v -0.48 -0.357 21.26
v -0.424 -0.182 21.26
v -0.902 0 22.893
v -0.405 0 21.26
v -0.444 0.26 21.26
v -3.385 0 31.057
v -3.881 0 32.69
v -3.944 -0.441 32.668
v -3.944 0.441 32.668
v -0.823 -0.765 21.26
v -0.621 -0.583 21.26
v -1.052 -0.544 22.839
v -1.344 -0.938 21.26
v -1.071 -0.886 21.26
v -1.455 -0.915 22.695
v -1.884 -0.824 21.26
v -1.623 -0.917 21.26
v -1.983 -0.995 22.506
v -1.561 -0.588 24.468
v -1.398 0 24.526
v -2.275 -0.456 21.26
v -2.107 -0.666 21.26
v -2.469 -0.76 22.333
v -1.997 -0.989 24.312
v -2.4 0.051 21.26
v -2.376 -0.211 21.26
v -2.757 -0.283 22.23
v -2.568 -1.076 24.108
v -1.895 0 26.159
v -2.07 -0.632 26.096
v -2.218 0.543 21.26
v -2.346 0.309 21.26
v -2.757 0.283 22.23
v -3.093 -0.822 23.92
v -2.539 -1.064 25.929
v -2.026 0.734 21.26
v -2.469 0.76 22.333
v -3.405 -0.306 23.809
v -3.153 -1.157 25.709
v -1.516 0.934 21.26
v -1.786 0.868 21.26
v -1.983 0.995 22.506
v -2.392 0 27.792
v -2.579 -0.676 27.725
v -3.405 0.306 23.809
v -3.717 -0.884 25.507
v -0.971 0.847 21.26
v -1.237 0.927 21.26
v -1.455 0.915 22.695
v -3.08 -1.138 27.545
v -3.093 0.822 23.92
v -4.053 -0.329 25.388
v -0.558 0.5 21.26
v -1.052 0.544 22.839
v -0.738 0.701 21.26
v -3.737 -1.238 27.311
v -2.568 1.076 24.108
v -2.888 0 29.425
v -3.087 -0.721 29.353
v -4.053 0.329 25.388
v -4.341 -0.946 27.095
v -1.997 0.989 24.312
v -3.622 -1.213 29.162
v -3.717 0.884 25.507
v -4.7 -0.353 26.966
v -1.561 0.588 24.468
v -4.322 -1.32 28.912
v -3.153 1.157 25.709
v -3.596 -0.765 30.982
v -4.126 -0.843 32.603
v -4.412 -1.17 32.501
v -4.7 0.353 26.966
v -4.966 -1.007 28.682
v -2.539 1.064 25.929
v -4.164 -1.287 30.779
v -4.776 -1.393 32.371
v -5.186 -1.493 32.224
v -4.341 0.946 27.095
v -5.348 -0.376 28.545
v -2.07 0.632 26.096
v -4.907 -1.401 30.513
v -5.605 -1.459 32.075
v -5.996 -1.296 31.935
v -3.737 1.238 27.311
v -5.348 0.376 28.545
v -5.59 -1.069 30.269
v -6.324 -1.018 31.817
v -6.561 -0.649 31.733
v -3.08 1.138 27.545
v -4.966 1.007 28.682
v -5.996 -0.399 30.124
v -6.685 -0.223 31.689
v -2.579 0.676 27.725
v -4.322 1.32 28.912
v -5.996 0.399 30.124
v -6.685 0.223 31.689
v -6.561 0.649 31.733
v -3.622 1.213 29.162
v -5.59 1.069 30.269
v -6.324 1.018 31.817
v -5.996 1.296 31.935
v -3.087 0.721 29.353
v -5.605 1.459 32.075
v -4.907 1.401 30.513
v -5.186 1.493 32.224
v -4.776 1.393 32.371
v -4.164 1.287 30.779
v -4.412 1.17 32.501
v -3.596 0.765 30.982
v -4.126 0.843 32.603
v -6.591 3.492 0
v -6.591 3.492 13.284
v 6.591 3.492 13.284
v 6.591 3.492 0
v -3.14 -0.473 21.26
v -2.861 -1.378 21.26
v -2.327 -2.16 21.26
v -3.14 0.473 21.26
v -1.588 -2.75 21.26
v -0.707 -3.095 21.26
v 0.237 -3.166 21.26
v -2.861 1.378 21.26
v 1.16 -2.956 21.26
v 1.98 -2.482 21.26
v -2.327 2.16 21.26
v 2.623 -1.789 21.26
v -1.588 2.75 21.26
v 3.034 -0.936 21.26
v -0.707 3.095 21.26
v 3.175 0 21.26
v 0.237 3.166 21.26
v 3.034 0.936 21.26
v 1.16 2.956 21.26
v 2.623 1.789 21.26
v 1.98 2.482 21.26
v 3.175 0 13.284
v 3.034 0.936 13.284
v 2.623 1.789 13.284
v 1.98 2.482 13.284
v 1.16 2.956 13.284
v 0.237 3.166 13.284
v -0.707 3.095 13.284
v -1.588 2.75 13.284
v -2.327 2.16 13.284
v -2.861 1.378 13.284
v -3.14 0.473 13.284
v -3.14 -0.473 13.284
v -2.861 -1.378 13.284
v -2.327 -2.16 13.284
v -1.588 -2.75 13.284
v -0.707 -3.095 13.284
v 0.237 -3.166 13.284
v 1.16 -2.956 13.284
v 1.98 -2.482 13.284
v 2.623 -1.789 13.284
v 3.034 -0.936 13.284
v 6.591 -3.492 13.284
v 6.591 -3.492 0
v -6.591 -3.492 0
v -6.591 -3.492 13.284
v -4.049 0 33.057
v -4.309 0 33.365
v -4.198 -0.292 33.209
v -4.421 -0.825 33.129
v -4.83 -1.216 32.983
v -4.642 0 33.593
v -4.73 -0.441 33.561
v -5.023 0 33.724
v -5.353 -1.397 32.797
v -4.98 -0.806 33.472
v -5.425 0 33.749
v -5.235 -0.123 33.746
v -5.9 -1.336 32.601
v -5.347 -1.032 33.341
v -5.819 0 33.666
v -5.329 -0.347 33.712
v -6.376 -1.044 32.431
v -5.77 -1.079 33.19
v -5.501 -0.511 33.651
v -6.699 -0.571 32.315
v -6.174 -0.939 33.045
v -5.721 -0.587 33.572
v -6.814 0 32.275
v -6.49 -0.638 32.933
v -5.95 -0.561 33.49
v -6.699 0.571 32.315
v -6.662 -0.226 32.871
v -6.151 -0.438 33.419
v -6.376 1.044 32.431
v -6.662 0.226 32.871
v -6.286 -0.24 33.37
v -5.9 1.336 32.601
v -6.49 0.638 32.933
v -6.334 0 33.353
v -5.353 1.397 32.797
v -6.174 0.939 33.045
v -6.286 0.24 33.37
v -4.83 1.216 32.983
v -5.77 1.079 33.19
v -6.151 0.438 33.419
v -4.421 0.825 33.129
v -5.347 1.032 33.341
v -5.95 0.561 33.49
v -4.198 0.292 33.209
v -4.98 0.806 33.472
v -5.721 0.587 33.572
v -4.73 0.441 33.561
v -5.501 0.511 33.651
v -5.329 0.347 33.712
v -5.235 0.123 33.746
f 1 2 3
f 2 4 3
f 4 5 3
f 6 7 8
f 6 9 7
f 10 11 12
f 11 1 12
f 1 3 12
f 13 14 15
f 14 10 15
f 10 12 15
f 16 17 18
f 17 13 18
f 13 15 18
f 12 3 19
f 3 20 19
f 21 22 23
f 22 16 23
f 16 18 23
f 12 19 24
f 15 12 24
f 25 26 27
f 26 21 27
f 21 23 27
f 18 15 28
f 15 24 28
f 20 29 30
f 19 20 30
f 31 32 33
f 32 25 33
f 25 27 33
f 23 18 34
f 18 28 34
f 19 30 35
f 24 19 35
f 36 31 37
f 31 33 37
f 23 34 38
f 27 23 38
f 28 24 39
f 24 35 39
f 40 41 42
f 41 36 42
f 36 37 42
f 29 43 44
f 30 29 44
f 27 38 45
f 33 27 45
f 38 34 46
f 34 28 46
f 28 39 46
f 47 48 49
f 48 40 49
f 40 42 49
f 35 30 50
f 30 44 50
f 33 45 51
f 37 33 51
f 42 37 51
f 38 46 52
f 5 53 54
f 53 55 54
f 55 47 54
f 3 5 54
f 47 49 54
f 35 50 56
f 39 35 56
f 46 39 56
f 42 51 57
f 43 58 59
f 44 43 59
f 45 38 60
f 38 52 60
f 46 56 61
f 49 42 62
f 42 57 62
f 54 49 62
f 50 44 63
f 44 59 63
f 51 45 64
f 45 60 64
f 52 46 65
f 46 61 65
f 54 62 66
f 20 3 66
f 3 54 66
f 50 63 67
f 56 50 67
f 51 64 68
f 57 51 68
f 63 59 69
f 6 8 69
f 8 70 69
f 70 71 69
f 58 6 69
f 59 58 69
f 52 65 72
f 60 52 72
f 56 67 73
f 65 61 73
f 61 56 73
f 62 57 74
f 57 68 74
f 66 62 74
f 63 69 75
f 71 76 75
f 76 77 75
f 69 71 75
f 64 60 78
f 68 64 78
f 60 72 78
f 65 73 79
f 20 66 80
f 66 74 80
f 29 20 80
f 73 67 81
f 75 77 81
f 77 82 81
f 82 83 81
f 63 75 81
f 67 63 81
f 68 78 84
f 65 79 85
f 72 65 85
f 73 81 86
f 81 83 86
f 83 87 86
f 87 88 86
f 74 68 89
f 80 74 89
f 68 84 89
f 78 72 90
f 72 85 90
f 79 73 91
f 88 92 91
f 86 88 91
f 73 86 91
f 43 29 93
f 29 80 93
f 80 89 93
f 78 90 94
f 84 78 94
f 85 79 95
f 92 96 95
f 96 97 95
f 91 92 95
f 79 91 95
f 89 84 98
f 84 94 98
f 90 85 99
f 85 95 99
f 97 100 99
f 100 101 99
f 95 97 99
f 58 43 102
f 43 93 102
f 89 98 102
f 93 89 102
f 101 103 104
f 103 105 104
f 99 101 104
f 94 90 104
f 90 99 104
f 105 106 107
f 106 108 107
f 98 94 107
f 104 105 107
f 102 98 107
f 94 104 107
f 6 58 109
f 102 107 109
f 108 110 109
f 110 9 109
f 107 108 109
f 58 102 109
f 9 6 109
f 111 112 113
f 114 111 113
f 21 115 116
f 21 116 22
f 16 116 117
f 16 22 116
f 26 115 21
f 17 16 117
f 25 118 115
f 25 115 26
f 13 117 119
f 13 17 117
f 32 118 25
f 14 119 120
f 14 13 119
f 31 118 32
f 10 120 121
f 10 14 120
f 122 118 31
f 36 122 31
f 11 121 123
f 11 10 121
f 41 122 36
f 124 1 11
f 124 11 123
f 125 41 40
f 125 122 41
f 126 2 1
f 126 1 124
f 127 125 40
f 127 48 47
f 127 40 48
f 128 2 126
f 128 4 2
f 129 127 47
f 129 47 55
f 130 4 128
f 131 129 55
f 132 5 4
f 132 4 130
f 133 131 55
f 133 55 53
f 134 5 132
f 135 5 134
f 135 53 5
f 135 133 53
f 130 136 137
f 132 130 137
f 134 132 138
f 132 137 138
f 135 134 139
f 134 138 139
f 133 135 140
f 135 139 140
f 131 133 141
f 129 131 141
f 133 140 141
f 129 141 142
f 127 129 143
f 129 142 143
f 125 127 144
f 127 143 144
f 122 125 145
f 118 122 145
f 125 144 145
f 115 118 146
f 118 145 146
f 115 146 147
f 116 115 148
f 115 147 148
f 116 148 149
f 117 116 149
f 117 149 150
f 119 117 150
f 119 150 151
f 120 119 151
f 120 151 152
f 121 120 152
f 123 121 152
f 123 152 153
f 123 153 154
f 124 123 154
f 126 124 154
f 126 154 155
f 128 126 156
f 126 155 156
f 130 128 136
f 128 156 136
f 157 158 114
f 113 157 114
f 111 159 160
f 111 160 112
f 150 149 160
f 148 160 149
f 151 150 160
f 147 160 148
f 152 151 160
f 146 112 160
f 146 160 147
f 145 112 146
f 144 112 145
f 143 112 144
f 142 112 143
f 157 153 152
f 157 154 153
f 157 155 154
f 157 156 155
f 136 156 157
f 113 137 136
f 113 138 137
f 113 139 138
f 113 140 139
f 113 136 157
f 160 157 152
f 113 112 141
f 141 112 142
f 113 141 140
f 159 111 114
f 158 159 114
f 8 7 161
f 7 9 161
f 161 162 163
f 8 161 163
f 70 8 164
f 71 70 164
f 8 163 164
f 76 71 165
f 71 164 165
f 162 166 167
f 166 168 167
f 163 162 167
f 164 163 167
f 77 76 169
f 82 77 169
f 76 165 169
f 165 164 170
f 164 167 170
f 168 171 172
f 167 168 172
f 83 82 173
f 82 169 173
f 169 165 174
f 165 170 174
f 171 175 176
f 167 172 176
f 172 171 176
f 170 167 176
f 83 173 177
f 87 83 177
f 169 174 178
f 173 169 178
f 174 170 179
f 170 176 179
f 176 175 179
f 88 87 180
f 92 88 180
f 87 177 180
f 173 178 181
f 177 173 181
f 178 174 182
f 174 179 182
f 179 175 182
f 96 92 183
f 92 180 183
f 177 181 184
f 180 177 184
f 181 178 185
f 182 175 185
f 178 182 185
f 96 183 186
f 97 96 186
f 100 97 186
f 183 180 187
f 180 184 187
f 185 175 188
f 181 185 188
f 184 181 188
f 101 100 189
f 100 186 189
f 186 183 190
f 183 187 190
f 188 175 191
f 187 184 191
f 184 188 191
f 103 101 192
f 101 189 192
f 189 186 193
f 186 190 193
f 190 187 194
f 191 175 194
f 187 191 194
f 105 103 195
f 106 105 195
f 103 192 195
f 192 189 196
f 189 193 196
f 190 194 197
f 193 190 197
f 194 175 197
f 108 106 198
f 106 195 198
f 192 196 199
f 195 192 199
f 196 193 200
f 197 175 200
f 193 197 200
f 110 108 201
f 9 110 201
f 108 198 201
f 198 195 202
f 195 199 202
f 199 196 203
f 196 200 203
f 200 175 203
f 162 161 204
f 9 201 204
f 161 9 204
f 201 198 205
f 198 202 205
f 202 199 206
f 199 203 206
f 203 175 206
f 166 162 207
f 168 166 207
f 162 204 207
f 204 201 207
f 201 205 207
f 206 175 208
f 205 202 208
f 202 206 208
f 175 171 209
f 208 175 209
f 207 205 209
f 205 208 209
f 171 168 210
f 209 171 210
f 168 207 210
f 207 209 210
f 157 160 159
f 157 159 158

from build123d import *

# Parameters (mm, degrees)
F0_W     = 13.1826
F0_H     = 6.985
F1_DEPTH = 13.2842
F2_R     = 3.175
F3_DEPTH = 7.9756


with BuildPart() as f1:
    # F0 (on Top) → F1 (new body)
    with BuildSketch(Plane.XY):
        Rectangle(F0_W, F0_H)
    extrude(amount=F1_DEPTH)

    # F2 (on face) → F3 (join)
    with BuildSketch(Plane.XY.offset(13.2842)):
        Circle(F2_R)
    extrude(amount=F3_DEPTH)

    # F5 (on offset) → F6 (revolve)
    with BuildSketch(Plane.XZ):
        with BuildLine():
            Line((-5.8194979442, 33.6655315498), (-1.3858759776, 21.2598))
            Line((-1.3858759776, 21.2598), (-0.4049631825, 21.2598))
            Line((-0.4049631825, 21.2598), (-3.8814046251, 32.6904004058))
            ThreePointArc((-3.8814046251, 32.6904004058), (-4.6416068333, 33.5930486447), (-5.8194979442, 33.6655315498))
        make_face()
    revolve(axis=Axis((-3.6026869609, 0, 27.4626657749), (0.3365385867, 0, -0.9416696765)))


solid = f1.part
